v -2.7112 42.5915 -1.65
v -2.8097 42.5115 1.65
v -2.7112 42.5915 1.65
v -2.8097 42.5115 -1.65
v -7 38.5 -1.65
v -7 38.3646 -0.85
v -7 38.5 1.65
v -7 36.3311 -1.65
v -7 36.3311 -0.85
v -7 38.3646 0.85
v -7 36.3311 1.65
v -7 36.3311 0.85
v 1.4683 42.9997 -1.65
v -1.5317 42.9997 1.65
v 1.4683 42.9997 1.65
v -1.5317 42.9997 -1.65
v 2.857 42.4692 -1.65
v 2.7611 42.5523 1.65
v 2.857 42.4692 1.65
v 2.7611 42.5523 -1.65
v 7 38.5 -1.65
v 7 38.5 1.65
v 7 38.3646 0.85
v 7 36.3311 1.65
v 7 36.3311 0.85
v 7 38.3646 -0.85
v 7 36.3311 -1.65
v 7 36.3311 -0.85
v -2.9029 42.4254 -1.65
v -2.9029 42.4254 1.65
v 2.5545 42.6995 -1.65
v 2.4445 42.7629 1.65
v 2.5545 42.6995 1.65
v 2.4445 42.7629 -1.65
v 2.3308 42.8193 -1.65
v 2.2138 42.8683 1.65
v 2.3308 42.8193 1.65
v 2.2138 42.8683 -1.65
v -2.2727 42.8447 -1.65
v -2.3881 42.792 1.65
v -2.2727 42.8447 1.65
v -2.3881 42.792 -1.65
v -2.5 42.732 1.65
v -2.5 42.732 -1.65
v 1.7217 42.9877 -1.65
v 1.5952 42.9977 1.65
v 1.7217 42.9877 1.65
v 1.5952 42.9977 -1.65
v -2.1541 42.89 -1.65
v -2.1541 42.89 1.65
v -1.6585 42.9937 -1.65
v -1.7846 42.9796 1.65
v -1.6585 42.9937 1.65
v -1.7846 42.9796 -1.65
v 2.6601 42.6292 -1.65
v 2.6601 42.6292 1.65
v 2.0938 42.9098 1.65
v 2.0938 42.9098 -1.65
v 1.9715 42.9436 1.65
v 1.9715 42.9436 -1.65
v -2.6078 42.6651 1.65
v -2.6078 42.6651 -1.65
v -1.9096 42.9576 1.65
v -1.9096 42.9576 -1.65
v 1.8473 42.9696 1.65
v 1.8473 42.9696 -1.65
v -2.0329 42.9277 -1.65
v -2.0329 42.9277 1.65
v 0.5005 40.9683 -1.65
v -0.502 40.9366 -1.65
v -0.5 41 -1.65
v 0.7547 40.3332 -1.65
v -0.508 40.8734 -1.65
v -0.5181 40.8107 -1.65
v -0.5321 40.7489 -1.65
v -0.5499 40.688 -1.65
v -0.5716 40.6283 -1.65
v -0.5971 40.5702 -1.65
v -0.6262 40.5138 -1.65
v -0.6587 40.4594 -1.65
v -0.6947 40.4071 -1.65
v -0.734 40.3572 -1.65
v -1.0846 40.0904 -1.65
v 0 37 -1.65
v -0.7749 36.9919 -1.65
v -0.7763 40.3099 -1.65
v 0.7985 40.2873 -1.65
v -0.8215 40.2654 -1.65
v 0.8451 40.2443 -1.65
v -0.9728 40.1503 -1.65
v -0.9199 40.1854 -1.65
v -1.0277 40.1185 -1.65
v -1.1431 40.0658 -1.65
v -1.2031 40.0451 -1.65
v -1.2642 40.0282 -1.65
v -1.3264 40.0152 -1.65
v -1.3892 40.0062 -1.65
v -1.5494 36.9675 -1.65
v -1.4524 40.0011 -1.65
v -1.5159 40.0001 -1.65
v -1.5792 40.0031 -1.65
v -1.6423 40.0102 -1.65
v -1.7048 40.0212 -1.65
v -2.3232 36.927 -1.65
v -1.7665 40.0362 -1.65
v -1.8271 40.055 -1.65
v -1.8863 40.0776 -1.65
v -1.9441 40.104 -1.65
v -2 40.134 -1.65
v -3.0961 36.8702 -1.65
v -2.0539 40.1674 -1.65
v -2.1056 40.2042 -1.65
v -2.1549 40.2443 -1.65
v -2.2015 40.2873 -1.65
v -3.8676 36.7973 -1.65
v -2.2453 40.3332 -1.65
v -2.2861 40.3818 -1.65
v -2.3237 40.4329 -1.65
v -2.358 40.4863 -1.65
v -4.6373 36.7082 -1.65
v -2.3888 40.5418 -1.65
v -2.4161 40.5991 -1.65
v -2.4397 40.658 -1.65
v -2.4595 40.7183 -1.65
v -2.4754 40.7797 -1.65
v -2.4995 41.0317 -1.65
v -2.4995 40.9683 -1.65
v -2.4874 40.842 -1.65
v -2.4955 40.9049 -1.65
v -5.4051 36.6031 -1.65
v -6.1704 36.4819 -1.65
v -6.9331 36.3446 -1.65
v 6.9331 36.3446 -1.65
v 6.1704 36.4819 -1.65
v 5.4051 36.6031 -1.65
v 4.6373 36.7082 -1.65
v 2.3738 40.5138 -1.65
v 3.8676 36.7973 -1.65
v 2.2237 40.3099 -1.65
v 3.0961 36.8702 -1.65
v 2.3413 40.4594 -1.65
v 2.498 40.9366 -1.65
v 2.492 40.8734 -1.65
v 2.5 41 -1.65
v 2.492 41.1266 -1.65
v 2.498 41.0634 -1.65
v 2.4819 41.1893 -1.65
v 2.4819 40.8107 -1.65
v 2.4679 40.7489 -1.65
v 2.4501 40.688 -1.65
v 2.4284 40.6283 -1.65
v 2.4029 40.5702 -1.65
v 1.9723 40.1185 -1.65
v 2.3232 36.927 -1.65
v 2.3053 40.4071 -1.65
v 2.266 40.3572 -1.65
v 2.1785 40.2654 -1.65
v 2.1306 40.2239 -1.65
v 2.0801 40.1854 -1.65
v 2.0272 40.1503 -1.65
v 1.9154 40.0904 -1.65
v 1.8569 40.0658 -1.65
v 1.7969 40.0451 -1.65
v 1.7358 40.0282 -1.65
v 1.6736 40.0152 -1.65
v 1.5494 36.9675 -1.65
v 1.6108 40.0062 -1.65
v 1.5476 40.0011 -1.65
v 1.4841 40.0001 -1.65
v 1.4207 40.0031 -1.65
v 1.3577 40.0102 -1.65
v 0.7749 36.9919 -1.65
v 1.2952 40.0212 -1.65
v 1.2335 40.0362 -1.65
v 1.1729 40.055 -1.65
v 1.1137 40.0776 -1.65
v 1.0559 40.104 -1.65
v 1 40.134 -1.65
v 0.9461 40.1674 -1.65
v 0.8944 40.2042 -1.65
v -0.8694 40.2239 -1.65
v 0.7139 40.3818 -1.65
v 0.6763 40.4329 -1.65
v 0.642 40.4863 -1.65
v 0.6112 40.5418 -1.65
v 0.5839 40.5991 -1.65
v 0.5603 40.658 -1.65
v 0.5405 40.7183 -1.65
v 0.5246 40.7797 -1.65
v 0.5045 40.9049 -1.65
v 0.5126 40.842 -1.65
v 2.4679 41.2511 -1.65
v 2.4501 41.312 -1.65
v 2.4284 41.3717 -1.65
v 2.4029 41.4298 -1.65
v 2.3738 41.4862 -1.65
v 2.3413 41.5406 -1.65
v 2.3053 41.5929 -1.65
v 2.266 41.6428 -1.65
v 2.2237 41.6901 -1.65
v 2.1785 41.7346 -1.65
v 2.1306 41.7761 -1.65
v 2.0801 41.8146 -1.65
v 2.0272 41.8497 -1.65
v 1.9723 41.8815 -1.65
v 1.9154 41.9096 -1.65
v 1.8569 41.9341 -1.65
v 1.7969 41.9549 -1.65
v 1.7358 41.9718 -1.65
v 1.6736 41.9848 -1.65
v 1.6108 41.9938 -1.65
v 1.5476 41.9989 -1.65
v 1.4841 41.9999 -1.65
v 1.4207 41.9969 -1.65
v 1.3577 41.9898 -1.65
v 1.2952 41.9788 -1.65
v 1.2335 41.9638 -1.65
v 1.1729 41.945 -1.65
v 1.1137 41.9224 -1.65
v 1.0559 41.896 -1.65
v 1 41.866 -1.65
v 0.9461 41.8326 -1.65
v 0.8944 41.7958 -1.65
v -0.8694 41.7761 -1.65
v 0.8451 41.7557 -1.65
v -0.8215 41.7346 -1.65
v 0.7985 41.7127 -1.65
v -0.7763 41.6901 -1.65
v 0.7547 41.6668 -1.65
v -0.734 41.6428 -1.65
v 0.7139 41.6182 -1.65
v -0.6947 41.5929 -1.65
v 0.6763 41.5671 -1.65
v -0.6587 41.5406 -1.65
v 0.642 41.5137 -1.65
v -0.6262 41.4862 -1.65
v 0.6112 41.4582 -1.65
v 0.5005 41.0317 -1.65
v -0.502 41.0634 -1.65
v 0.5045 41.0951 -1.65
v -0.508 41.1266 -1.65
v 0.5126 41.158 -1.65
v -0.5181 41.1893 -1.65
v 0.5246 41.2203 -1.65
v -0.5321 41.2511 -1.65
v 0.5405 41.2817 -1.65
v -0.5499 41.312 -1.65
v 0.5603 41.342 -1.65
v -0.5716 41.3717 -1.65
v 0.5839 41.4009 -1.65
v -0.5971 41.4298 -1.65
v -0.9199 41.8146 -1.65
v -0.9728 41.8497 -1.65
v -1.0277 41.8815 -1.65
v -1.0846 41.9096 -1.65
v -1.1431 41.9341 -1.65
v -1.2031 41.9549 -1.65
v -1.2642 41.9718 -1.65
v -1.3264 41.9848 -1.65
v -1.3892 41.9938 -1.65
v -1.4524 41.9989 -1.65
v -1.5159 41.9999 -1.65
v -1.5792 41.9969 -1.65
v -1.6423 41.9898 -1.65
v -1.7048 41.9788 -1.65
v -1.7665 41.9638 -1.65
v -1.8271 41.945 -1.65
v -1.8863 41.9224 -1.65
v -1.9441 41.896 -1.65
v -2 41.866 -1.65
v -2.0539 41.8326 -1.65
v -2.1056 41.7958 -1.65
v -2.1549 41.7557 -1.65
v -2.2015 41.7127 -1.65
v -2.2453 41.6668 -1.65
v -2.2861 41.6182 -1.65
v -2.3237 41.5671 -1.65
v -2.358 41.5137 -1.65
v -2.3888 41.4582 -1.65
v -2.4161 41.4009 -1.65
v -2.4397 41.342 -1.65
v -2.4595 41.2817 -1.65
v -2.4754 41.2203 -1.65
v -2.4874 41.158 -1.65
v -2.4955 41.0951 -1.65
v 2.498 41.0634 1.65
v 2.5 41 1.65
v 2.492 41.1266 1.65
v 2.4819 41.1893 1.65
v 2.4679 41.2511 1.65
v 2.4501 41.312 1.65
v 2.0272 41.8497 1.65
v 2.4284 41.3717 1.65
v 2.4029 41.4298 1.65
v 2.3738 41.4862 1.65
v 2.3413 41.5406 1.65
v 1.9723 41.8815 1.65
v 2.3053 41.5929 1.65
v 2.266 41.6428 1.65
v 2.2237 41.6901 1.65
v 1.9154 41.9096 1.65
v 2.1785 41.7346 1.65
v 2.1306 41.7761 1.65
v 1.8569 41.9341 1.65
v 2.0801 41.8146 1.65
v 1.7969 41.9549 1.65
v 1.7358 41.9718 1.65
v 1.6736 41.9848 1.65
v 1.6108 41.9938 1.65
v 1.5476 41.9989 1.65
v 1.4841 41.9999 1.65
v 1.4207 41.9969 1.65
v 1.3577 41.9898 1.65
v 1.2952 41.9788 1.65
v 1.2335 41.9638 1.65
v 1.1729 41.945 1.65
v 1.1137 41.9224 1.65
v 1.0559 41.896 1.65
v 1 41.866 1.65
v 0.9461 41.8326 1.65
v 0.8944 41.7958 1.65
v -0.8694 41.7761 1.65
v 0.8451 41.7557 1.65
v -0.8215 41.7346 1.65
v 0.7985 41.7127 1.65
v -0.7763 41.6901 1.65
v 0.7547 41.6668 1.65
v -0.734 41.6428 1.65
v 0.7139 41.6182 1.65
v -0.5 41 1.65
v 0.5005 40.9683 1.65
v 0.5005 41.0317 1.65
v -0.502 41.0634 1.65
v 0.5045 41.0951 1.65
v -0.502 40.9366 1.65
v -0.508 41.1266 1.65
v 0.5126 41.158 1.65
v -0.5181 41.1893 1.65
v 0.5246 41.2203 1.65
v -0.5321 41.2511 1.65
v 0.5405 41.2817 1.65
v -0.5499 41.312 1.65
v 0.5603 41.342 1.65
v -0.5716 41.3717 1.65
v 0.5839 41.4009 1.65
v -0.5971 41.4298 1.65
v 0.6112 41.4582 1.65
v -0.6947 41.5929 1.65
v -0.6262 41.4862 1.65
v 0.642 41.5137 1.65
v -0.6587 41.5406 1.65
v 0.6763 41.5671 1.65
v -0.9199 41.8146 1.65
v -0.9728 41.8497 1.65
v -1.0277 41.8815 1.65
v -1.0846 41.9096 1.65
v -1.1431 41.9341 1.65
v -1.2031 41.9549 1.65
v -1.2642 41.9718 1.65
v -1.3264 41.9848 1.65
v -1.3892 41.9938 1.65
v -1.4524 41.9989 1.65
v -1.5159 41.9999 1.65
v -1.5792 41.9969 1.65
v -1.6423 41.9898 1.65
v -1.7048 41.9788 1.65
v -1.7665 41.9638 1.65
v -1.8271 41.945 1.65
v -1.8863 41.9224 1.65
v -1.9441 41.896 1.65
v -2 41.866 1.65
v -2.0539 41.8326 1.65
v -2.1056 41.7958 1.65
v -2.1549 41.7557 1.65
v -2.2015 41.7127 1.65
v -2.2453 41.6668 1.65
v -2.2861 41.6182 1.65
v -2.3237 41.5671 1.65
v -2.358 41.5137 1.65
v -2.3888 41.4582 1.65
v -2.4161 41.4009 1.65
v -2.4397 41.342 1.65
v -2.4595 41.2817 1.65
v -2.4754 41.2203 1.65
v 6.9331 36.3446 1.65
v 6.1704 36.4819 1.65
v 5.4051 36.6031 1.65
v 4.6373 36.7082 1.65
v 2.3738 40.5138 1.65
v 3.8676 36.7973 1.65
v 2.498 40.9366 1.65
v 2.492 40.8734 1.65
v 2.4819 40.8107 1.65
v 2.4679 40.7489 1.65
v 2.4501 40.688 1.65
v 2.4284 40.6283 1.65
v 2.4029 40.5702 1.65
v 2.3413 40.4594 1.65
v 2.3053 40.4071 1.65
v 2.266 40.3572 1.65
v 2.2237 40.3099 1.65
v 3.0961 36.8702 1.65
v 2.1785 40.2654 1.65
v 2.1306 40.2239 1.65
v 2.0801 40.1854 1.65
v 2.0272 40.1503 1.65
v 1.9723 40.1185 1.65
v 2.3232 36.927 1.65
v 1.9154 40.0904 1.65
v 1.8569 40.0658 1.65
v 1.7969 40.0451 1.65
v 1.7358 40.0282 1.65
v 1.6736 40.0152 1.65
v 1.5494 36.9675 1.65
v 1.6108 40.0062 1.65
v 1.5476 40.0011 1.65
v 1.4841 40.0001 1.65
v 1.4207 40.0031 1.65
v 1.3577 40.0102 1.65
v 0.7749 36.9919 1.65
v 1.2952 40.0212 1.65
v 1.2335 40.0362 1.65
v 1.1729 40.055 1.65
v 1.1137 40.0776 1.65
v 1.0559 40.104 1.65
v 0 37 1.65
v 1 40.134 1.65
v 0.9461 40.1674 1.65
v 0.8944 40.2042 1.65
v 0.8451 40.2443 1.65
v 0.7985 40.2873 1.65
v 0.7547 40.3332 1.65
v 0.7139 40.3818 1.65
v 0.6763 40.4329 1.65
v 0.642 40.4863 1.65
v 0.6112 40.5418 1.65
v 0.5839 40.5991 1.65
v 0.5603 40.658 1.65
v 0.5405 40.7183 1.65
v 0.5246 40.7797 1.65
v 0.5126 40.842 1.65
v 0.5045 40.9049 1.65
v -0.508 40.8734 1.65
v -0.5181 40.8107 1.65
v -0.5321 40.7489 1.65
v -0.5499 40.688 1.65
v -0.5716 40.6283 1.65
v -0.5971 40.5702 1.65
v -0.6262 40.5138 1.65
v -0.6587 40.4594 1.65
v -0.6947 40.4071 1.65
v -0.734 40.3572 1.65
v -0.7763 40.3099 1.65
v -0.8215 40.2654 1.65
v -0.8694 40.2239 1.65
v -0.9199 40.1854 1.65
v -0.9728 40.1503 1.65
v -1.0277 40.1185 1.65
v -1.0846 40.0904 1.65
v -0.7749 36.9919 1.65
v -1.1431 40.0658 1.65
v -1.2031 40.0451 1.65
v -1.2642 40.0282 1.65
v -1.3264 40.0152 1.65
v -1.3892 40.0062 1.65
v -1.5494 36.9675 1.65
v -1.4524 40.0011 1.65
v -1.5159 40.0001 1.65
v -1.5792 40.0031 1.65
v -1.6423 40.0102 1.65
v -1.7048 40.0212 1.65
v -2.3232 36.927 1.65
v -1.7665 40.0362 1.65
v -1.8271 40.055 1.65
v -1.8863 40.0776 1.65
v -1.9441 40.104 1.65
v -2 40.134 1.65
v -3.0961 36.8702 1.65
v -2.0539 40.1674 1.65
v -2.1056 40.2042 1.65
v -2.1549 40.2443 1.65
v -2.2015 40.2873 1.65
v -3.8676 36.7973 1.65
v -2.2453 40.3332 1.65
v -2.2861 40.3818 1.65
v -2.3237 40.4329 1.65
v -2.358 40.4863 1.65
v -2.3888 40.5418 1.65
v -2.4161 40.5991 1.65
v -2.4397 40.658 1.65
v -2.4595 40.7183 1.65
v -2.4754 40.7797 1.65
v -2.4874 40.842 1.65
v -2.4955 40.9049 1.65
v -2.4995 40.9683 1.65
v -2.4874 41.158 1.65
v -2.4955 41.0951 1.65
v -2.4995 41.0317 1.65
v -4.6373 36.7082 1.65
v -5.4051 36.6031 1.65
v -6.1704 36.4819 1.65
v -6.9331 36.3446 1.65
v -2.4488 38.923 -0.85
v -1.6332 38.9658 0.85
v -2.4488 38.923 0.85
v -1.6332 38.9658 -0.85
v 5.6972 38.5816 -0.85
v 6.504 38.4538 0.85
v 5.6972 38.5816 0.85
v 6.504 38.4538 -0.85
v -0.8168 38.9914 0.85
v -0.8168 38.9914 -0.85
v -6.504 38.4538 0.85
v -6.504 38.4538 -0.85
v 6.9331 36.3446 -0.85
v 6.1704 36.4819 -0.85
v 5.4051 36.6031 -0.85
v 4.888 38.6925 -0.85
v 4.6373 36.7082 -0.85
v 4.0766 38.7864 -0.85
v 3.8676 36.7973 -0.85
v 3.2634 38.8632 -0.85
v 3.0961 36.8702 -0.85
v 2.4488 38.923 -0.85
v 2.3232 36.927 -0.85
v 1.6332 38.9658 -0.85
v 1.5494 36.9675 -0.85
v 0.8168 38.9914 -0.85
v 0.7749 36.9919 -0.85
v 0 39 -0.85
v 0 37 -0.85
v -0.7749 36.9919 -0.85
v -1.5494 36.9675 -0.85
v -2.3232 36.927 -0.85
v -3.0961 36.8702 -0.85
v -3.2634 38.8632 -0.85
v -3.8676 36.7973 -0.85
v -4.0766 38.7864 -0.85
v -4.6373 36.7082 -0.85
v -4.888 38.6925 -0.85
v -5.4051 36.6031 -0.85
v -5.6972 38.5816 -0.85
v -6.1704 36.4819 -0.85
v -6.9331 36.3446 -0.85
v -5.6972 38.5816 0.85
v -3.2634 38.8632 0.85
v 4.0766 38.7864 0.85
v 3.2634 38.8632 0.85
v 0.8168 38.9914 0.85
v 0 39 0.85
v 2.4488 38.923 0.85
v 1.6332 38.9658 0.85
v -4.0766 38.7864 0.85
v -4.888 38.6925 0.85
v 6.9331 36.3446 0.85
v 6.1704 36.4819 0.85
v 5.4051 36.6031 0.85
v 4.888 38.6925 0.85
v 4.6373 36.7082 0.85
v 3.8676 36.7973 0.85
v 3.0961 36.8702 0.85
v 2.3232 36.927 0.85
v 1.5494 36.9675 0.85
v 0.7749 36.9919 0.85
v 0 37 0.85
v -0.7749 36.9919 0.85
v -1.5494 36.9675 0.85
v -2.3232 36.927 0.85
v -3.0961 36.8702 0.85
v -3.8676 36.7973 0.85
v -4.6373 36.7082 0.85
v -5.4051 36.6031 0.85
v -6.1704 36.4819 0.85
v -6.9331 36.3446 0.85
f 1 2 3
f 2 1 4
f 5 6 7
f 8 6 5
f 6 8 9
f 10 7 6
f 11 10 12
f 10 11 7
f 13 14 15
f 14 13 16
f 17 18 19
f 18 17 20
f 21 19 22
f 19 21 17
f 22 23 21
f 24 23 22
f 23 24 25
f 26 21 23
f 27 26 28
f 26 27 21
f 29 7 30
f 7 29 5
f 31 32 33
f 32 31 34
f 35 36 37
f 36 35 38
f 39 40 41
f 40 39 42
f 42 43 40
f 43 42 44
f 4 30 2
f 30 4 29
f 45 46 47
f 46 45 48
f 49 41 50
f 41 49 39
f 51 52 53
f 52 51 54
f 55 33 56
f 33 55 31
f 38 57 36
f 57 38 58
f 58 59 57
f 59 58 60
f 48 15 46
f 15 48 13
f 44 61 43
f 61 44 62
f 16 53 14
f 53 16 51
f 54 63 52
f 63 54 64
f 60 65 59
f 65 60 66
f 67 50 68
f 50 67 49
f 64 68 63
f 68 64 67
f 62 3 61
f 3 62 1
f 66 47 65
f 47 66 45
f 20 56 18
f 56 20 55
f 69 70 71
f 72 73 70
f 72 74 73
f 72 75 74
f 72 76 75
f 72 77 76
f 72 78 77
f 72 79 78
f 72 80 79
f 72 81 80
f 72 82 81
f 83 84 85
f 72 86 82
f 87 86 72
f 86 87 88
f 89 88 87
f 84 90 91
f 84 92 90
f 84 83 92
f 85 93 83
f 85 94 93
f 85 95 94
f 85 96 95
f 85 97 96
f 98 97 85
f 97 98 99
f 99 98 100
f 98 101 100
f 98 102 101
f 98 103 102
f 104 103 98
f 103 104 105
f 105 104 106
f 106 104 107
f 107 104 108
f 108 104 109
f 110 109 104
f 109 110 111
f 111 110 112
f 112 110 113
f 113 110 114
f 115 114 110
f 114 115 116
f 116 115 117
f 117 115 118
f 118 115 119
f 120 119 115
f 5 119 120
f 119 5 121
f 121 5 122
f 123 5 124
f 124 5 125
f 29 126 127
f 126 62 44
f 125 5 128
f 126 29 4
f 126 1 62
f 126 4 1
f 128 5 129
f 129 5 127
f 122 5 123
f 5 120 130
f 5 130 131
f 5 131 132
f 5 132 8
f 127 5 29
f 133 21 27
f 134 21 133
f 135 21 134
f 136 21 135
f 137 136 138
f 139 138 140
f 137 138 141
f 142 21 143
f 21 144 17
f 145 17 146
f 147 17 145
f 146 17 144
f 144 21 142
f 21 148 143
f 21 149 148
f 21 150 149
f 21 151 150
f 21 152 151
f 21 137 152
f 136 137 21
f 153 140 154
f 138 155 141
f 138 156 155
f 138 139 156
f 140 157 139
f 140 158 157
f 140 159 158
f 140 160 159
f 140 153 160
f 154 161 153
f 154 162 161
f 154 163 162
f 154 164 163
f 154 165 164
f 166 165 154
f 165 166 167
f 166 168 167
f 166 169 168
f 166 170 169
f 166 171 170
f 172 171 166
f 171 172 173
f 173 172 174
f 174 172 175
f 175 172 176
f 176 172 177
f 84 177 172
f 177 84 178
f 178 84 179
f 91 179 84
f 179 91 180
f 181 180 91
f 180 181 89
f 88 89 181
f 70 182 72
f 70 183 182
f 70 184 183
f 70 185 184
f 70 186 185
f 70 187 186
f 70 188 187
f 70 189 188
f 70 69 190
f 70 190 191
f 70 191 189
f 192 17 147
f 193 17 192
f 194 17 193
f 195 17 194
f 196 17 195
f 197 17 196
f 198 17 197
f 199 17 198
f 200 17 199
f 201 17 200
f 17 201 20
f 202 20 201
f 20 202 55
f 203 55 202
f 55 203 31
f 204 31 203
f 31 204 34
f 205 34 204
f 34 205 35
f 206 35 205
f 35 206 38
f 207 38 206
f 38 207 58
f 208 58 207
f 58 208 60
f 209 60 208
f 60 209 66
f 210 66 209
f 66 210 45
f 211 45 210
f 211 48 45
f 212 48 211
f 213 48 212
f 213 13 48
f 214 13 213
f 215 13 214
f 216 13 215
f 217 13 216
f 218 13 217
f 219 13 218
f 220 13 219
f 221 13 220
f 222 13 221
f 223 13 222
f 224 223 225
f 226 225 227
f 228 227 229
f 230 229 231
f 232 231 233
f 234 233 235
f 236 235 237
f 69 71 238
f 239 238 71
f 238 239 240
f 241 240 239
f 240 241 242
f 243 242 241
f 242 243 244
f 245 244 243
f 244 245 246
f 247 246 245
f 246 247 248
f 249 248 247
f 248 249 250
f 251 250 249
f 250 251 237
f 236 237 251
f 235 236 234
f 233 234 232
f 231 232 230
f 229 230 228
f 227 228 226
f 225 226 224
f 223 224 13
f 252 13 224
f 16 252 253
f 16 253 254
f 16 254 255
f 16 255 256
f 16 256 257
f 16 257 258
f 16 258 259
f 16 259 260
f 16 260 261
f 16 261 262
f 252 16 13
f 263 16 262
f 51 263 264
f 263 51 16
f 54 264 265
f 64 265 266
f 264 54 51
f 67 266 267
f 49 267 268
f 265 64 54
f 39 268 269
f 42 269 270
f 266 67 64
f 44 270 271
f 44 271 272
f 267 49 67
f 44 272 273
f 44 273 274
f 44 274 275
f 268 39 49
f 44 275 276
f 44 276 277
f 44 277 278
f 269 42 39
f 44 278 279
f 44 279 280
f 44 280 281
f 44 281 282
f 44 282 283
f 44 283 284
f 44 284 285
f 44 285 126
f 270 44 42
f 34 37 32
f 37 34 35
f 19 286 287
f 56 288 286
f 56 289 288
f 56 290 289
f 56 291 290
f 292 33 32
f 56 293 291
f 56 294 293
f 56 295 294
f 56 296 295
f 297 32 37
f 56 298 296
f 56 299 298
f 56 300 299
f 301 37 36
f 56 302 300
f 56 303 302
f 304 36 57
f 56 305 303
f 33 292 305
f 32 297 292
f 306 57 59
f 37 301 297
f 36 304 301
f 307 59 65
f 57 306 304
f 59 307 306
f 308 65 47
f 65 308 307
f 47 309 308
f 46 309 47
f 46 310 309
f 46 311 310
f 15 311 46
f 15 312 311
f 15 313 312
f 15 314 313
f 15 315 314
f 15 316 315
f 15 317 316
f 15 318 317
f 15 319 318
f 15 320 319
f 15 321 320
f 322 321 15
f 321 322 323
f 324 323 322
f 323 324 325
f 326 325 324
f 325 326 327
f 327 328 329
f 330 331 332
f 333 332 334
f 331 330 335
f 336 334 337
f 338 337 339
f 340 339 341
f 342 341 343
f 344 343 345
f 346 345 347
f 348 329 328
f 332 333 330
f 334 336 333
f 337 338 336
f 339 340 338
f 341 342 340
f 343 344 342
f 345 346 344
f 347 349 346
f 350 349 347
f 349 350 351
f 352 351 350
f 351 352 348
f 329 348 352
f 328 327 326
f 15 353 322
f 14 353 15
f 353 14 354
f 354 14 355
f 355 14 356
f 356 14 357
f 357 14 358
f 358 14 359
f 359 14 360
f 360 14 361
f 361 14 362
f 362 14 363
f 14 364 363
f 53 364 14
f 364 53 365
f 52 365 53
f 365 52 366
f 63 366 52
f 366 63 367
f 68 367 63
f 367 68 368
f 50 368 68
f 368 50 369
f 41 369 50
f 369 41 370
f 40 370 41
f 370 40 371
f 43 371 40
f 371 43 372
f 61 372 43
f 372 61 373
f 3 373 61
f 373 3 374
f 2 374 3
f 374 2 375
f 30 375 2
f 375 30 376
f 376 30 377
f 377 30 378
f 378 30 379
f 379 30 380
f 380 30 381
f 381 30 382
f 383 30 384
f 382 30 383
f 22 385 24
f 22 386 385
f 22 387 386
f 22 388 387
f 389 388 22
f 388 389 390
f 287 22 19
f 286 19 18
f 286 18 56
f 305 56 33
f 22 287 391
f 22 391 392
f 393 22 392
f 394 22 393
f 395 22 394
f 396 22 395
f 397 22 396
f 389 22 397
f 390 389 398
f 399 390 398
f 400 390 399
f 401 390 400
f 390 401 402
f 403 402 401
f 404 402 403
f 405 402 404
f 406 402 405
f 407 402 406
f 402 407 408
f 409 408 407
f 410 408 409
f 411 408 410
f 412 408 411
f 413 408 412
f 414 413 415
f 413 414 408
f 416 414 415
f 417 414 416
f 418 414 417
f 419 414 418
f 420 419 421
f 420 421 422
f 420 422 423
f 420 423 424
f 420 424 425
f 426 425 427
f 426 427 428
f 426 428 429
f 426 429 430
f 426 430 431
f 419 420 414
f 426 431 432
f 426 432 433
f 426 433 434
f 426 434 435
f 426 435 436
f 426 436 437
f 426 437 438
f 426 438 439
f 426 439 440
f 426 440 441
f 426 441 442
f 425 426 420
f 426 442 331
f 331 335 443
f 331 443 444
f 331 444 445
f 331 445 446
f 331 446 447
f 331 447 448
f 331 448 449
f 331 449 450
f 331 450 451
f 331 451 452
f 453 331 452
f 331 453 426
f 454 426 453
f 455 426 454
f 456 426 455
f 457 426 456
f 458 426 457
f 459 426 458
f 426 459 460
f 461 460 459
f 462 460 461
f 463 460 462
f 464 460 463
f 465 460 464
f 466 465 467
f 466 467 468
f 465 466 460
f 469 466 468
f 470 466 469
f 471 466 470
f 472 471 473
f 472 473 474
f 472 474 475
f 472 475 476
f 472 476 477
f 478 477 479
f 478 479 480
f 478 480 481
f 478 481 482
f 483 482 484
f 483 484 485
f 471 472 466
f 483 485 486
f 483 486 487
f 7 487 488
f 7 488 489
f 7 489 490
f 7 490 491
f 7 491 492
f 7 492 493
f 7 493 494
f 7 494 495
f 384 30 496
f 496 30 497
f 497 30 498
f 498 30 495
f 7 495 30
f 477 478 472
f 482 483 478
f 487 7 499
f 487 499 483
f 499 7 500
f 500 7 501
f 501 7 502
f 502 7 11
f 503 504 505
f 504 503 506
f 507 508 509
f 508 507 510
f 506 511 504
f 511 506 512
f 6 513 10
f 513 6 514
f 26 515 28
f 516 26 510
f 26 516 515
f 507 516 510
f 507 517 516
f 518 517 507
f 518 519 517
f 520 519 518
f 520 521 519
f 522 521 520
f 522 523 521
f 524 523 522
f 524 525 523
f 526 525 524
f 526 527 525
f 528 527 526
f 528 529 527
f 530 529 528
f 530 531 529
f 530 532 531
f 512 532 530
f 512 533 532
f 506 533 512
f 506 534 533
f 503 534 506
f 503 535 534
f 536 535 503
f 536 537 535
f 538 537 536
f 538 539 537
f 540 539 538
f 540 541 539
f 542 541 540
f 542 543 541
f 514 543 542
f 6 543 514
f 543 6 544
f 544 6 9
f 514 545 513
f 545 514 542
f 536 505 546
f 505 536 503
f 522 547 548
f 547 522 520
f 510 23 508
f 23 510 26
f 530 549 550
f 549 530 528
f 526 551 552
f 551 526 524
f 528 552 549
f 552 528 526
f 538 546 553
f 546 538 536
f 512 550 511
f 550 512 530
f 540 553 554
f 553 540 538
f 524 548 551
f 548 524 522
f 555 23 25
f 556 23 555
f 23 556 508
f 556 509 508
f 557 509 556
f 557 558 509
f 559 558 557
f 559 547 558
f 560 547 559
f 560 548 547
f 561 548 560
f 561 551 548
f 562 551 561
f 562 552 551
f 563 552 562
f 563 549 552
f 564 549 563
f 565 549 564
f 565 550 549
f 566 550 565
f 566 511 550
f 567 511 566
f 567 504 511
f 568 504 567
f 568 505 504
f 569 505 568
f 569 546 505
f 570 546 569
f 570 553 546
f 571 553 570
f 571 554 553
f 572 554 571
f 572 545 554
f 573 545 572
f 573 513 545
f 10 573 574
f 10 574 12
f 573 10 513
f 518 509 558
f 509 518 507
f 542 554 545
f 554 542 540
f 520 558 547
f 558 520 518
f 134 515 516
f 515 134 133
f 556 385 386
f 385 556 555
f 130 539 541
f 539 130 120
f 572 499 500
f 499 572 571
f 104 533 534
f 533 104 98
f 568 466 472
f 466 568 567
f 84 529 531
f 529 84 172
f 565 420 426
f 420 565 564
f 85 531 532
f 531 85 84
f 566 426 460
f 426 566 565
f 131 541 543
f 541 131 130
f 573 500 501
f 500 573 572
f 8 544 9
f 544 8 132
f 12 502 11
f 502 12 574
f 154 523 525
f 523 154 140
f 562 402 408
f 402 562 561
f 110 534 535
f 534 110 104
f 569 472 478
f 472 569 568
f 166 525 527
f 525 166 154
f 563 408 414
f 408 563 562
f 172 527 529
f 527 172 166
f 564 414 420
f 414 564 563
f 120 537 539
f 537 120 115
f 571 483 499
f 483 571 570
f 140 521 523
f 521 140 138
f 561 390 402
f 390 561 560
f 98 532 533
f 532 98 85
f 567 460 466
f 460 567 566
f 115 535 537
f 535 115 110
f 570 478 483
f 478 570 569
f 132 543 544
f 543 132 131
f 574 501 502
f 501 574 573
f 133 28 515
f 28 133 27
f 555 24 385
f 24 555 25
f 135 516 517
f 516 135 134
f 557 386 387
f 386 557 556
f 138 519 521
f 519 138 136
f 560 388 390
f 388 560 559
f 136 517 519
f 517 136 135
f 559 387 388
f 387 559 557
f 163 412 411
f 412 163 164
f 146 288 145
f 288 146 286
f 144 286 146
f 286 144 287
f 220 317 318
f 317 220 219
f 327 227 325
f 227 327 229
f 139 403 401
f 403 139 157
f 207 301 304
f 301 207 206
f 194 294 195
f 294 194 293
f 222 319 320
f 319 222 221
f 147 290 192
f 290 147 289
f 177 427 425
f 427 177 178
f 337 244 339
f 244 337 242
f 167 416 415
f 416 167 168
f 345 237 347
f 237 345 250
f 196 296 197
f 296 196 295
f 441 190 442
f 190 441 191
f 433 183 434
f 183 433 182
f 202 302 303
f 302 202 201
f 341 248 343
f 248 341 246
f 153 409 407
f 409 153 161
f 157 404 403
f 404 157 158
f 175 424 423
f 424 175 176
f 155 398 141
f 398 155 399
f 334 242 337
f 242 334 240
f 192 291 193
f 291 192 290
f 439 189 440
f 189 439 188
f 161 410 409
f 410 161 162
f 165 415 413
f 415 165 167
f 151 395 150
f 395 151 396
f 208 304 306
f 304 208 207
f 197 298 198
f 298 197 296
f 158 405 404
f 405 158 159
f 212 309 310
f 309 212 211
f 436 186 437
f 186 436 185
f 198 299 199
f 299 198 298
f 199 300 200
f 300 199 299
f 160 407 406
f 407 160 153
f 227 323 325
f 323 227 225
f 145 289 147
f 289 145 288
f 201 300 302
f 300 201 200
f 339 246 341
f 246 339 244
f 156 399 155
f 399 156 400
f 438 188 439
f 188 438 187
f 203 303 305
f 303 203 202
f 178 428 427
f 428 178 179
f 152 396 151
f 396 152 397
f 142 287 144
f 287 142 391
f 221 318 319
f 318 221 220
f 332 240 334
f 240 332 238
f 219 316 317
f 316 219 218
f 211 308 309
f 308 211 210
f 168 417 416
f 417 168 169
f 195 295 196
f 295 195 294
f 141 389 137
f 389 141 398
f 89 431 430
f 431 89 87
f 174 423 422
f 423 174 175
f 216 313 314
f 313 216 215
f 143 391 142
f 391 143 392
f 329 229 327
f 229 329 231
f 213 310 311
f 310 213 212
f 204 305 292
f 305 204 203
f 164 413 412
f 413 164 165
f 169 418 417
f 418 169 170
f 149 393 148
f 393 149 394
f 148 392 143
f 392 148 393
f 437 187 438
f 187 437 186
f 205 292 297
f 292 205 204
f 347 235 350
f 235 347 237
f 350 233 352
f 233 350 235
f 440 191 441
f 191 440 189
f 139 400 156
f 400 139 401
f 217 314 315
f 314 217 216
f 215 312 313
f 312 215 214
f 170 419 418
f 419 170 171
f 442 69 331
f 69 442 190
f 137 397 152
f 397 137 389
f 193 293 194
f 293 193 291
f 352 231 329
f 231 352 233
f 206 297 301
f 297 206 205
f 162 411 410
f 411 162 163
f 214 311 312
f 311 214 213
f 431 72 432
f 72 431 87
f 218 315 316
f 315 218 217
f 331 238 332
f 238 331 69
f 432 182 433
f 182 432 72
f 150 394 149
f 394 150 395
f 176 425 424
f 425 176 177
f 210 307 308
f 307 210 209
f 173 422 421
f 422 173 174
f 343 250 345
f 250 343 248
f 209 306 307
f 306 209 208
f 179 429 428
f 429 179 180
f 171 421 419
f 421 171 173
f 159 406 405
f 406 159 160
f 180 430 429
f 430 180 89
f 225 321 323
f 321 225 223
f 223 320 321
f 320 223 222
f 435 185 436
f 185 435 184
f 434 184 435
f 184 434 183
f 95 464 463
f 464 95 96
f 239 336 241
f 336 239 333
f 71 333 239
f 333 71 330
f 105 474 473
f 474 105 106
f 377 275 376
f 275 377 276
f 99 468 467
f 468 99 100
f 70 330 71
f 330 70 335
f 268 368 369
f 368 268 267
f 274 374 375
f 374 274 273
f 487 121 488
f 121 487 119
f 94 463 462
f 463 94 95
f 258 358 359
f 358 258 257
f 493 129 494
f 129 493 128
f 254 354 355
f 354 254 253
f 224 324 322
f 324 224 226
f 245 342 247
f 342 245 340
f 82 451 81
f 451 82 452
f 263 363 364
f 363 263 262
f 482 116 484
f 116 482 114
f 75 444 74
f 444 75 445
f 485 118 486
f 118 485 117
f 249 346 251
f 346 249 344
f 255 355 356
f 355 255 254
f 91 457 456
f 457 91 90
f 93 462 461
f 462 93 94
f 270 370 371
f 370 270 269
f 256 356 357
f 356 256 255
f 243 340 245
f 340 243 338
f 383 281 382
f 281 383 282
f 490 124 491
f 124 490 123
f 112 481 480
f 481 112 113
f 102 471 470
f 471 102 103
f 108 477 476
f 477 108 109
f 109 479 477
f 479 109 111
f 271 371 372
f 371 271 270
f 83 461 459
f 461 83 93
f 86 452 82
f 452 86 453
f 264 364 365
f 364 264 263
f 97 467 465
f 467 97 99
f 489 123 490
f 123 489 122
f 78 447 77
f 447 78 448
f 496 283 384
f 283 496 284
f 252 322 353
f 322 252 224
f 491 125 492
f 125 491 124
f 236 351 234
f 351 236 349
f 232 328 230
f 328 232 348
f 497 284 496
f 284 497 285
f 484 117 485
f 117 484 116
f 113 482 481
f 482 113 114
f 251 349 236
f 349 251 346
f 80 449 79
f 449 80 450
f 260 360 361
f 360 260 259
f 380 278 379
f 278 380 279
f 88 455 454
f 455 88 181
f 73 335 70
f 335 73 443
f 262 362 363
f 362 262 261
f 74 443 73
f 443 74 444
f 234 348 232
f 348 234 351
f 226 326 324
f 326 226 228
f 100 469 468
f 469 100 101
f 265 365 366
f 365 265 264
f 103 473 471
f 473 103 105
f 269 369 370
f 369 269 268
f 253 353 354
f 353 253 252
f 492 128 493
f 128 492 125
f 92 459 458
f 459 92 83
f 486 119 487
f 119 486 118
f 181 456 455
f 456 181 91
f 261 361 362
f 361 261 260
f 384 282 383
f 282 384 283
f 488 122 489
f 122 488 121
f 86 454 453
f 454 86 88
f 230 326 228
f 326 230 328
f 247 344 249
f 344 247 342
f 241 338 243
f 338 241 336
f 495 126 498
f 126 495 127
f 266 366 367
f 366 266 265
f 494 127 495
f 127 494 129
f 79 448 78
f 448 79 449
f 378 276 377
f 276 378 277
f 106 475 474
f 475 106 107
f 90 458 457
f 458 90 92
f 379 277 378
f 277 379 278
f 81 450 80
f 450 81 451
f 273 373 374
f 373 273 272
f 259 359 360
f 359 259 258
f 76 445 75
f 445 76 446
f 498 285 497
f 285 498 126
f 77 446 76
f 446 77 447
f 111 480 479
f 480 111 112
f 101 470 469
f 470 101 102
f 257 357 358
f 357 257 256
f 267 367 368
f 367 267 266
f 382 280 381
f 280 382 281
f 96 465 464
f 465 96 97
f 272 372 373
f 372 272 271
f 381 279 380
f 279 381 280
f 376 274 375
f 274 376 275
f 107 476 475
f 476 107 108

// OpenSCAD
// diskClip.scad
//
// clip-on hanger loop for the Mountain Sun / Longs Peak disks
//====================================================================







//---------------------------------------------------------------------
module diskClip(){

$fn=99;

thick=1.5+1.8;

difference(){
  
  hull(){
    translate([1.5,41,0])
    cylinder(r=2,h=thick,center=true);
    translate([-1.5,41,0])
    cylinder(r=2,h=thick,center=true);
    translate([0,37,0])
    cube([14,3,thick],center=true);
  }
  
  // disk
  translate([0,0,0])
  cylinder(r=39,h=1.5+0.2,$fn=300,center=true);

  // trim boss to match disk
  translate([0,0,-0.75])
  cylinder(r=39-2,h=thick*3,$fn=300,center=true);
  

  // loop holes
  translate([1.5,41,0])
  cylinder(r=1,h=10,center=true);
  translate([-1.5,41,0])
  cylinder(r=1,h=10,center=true);
  
}

}

//=====================================================================

diskClip();


//=====================================================================
